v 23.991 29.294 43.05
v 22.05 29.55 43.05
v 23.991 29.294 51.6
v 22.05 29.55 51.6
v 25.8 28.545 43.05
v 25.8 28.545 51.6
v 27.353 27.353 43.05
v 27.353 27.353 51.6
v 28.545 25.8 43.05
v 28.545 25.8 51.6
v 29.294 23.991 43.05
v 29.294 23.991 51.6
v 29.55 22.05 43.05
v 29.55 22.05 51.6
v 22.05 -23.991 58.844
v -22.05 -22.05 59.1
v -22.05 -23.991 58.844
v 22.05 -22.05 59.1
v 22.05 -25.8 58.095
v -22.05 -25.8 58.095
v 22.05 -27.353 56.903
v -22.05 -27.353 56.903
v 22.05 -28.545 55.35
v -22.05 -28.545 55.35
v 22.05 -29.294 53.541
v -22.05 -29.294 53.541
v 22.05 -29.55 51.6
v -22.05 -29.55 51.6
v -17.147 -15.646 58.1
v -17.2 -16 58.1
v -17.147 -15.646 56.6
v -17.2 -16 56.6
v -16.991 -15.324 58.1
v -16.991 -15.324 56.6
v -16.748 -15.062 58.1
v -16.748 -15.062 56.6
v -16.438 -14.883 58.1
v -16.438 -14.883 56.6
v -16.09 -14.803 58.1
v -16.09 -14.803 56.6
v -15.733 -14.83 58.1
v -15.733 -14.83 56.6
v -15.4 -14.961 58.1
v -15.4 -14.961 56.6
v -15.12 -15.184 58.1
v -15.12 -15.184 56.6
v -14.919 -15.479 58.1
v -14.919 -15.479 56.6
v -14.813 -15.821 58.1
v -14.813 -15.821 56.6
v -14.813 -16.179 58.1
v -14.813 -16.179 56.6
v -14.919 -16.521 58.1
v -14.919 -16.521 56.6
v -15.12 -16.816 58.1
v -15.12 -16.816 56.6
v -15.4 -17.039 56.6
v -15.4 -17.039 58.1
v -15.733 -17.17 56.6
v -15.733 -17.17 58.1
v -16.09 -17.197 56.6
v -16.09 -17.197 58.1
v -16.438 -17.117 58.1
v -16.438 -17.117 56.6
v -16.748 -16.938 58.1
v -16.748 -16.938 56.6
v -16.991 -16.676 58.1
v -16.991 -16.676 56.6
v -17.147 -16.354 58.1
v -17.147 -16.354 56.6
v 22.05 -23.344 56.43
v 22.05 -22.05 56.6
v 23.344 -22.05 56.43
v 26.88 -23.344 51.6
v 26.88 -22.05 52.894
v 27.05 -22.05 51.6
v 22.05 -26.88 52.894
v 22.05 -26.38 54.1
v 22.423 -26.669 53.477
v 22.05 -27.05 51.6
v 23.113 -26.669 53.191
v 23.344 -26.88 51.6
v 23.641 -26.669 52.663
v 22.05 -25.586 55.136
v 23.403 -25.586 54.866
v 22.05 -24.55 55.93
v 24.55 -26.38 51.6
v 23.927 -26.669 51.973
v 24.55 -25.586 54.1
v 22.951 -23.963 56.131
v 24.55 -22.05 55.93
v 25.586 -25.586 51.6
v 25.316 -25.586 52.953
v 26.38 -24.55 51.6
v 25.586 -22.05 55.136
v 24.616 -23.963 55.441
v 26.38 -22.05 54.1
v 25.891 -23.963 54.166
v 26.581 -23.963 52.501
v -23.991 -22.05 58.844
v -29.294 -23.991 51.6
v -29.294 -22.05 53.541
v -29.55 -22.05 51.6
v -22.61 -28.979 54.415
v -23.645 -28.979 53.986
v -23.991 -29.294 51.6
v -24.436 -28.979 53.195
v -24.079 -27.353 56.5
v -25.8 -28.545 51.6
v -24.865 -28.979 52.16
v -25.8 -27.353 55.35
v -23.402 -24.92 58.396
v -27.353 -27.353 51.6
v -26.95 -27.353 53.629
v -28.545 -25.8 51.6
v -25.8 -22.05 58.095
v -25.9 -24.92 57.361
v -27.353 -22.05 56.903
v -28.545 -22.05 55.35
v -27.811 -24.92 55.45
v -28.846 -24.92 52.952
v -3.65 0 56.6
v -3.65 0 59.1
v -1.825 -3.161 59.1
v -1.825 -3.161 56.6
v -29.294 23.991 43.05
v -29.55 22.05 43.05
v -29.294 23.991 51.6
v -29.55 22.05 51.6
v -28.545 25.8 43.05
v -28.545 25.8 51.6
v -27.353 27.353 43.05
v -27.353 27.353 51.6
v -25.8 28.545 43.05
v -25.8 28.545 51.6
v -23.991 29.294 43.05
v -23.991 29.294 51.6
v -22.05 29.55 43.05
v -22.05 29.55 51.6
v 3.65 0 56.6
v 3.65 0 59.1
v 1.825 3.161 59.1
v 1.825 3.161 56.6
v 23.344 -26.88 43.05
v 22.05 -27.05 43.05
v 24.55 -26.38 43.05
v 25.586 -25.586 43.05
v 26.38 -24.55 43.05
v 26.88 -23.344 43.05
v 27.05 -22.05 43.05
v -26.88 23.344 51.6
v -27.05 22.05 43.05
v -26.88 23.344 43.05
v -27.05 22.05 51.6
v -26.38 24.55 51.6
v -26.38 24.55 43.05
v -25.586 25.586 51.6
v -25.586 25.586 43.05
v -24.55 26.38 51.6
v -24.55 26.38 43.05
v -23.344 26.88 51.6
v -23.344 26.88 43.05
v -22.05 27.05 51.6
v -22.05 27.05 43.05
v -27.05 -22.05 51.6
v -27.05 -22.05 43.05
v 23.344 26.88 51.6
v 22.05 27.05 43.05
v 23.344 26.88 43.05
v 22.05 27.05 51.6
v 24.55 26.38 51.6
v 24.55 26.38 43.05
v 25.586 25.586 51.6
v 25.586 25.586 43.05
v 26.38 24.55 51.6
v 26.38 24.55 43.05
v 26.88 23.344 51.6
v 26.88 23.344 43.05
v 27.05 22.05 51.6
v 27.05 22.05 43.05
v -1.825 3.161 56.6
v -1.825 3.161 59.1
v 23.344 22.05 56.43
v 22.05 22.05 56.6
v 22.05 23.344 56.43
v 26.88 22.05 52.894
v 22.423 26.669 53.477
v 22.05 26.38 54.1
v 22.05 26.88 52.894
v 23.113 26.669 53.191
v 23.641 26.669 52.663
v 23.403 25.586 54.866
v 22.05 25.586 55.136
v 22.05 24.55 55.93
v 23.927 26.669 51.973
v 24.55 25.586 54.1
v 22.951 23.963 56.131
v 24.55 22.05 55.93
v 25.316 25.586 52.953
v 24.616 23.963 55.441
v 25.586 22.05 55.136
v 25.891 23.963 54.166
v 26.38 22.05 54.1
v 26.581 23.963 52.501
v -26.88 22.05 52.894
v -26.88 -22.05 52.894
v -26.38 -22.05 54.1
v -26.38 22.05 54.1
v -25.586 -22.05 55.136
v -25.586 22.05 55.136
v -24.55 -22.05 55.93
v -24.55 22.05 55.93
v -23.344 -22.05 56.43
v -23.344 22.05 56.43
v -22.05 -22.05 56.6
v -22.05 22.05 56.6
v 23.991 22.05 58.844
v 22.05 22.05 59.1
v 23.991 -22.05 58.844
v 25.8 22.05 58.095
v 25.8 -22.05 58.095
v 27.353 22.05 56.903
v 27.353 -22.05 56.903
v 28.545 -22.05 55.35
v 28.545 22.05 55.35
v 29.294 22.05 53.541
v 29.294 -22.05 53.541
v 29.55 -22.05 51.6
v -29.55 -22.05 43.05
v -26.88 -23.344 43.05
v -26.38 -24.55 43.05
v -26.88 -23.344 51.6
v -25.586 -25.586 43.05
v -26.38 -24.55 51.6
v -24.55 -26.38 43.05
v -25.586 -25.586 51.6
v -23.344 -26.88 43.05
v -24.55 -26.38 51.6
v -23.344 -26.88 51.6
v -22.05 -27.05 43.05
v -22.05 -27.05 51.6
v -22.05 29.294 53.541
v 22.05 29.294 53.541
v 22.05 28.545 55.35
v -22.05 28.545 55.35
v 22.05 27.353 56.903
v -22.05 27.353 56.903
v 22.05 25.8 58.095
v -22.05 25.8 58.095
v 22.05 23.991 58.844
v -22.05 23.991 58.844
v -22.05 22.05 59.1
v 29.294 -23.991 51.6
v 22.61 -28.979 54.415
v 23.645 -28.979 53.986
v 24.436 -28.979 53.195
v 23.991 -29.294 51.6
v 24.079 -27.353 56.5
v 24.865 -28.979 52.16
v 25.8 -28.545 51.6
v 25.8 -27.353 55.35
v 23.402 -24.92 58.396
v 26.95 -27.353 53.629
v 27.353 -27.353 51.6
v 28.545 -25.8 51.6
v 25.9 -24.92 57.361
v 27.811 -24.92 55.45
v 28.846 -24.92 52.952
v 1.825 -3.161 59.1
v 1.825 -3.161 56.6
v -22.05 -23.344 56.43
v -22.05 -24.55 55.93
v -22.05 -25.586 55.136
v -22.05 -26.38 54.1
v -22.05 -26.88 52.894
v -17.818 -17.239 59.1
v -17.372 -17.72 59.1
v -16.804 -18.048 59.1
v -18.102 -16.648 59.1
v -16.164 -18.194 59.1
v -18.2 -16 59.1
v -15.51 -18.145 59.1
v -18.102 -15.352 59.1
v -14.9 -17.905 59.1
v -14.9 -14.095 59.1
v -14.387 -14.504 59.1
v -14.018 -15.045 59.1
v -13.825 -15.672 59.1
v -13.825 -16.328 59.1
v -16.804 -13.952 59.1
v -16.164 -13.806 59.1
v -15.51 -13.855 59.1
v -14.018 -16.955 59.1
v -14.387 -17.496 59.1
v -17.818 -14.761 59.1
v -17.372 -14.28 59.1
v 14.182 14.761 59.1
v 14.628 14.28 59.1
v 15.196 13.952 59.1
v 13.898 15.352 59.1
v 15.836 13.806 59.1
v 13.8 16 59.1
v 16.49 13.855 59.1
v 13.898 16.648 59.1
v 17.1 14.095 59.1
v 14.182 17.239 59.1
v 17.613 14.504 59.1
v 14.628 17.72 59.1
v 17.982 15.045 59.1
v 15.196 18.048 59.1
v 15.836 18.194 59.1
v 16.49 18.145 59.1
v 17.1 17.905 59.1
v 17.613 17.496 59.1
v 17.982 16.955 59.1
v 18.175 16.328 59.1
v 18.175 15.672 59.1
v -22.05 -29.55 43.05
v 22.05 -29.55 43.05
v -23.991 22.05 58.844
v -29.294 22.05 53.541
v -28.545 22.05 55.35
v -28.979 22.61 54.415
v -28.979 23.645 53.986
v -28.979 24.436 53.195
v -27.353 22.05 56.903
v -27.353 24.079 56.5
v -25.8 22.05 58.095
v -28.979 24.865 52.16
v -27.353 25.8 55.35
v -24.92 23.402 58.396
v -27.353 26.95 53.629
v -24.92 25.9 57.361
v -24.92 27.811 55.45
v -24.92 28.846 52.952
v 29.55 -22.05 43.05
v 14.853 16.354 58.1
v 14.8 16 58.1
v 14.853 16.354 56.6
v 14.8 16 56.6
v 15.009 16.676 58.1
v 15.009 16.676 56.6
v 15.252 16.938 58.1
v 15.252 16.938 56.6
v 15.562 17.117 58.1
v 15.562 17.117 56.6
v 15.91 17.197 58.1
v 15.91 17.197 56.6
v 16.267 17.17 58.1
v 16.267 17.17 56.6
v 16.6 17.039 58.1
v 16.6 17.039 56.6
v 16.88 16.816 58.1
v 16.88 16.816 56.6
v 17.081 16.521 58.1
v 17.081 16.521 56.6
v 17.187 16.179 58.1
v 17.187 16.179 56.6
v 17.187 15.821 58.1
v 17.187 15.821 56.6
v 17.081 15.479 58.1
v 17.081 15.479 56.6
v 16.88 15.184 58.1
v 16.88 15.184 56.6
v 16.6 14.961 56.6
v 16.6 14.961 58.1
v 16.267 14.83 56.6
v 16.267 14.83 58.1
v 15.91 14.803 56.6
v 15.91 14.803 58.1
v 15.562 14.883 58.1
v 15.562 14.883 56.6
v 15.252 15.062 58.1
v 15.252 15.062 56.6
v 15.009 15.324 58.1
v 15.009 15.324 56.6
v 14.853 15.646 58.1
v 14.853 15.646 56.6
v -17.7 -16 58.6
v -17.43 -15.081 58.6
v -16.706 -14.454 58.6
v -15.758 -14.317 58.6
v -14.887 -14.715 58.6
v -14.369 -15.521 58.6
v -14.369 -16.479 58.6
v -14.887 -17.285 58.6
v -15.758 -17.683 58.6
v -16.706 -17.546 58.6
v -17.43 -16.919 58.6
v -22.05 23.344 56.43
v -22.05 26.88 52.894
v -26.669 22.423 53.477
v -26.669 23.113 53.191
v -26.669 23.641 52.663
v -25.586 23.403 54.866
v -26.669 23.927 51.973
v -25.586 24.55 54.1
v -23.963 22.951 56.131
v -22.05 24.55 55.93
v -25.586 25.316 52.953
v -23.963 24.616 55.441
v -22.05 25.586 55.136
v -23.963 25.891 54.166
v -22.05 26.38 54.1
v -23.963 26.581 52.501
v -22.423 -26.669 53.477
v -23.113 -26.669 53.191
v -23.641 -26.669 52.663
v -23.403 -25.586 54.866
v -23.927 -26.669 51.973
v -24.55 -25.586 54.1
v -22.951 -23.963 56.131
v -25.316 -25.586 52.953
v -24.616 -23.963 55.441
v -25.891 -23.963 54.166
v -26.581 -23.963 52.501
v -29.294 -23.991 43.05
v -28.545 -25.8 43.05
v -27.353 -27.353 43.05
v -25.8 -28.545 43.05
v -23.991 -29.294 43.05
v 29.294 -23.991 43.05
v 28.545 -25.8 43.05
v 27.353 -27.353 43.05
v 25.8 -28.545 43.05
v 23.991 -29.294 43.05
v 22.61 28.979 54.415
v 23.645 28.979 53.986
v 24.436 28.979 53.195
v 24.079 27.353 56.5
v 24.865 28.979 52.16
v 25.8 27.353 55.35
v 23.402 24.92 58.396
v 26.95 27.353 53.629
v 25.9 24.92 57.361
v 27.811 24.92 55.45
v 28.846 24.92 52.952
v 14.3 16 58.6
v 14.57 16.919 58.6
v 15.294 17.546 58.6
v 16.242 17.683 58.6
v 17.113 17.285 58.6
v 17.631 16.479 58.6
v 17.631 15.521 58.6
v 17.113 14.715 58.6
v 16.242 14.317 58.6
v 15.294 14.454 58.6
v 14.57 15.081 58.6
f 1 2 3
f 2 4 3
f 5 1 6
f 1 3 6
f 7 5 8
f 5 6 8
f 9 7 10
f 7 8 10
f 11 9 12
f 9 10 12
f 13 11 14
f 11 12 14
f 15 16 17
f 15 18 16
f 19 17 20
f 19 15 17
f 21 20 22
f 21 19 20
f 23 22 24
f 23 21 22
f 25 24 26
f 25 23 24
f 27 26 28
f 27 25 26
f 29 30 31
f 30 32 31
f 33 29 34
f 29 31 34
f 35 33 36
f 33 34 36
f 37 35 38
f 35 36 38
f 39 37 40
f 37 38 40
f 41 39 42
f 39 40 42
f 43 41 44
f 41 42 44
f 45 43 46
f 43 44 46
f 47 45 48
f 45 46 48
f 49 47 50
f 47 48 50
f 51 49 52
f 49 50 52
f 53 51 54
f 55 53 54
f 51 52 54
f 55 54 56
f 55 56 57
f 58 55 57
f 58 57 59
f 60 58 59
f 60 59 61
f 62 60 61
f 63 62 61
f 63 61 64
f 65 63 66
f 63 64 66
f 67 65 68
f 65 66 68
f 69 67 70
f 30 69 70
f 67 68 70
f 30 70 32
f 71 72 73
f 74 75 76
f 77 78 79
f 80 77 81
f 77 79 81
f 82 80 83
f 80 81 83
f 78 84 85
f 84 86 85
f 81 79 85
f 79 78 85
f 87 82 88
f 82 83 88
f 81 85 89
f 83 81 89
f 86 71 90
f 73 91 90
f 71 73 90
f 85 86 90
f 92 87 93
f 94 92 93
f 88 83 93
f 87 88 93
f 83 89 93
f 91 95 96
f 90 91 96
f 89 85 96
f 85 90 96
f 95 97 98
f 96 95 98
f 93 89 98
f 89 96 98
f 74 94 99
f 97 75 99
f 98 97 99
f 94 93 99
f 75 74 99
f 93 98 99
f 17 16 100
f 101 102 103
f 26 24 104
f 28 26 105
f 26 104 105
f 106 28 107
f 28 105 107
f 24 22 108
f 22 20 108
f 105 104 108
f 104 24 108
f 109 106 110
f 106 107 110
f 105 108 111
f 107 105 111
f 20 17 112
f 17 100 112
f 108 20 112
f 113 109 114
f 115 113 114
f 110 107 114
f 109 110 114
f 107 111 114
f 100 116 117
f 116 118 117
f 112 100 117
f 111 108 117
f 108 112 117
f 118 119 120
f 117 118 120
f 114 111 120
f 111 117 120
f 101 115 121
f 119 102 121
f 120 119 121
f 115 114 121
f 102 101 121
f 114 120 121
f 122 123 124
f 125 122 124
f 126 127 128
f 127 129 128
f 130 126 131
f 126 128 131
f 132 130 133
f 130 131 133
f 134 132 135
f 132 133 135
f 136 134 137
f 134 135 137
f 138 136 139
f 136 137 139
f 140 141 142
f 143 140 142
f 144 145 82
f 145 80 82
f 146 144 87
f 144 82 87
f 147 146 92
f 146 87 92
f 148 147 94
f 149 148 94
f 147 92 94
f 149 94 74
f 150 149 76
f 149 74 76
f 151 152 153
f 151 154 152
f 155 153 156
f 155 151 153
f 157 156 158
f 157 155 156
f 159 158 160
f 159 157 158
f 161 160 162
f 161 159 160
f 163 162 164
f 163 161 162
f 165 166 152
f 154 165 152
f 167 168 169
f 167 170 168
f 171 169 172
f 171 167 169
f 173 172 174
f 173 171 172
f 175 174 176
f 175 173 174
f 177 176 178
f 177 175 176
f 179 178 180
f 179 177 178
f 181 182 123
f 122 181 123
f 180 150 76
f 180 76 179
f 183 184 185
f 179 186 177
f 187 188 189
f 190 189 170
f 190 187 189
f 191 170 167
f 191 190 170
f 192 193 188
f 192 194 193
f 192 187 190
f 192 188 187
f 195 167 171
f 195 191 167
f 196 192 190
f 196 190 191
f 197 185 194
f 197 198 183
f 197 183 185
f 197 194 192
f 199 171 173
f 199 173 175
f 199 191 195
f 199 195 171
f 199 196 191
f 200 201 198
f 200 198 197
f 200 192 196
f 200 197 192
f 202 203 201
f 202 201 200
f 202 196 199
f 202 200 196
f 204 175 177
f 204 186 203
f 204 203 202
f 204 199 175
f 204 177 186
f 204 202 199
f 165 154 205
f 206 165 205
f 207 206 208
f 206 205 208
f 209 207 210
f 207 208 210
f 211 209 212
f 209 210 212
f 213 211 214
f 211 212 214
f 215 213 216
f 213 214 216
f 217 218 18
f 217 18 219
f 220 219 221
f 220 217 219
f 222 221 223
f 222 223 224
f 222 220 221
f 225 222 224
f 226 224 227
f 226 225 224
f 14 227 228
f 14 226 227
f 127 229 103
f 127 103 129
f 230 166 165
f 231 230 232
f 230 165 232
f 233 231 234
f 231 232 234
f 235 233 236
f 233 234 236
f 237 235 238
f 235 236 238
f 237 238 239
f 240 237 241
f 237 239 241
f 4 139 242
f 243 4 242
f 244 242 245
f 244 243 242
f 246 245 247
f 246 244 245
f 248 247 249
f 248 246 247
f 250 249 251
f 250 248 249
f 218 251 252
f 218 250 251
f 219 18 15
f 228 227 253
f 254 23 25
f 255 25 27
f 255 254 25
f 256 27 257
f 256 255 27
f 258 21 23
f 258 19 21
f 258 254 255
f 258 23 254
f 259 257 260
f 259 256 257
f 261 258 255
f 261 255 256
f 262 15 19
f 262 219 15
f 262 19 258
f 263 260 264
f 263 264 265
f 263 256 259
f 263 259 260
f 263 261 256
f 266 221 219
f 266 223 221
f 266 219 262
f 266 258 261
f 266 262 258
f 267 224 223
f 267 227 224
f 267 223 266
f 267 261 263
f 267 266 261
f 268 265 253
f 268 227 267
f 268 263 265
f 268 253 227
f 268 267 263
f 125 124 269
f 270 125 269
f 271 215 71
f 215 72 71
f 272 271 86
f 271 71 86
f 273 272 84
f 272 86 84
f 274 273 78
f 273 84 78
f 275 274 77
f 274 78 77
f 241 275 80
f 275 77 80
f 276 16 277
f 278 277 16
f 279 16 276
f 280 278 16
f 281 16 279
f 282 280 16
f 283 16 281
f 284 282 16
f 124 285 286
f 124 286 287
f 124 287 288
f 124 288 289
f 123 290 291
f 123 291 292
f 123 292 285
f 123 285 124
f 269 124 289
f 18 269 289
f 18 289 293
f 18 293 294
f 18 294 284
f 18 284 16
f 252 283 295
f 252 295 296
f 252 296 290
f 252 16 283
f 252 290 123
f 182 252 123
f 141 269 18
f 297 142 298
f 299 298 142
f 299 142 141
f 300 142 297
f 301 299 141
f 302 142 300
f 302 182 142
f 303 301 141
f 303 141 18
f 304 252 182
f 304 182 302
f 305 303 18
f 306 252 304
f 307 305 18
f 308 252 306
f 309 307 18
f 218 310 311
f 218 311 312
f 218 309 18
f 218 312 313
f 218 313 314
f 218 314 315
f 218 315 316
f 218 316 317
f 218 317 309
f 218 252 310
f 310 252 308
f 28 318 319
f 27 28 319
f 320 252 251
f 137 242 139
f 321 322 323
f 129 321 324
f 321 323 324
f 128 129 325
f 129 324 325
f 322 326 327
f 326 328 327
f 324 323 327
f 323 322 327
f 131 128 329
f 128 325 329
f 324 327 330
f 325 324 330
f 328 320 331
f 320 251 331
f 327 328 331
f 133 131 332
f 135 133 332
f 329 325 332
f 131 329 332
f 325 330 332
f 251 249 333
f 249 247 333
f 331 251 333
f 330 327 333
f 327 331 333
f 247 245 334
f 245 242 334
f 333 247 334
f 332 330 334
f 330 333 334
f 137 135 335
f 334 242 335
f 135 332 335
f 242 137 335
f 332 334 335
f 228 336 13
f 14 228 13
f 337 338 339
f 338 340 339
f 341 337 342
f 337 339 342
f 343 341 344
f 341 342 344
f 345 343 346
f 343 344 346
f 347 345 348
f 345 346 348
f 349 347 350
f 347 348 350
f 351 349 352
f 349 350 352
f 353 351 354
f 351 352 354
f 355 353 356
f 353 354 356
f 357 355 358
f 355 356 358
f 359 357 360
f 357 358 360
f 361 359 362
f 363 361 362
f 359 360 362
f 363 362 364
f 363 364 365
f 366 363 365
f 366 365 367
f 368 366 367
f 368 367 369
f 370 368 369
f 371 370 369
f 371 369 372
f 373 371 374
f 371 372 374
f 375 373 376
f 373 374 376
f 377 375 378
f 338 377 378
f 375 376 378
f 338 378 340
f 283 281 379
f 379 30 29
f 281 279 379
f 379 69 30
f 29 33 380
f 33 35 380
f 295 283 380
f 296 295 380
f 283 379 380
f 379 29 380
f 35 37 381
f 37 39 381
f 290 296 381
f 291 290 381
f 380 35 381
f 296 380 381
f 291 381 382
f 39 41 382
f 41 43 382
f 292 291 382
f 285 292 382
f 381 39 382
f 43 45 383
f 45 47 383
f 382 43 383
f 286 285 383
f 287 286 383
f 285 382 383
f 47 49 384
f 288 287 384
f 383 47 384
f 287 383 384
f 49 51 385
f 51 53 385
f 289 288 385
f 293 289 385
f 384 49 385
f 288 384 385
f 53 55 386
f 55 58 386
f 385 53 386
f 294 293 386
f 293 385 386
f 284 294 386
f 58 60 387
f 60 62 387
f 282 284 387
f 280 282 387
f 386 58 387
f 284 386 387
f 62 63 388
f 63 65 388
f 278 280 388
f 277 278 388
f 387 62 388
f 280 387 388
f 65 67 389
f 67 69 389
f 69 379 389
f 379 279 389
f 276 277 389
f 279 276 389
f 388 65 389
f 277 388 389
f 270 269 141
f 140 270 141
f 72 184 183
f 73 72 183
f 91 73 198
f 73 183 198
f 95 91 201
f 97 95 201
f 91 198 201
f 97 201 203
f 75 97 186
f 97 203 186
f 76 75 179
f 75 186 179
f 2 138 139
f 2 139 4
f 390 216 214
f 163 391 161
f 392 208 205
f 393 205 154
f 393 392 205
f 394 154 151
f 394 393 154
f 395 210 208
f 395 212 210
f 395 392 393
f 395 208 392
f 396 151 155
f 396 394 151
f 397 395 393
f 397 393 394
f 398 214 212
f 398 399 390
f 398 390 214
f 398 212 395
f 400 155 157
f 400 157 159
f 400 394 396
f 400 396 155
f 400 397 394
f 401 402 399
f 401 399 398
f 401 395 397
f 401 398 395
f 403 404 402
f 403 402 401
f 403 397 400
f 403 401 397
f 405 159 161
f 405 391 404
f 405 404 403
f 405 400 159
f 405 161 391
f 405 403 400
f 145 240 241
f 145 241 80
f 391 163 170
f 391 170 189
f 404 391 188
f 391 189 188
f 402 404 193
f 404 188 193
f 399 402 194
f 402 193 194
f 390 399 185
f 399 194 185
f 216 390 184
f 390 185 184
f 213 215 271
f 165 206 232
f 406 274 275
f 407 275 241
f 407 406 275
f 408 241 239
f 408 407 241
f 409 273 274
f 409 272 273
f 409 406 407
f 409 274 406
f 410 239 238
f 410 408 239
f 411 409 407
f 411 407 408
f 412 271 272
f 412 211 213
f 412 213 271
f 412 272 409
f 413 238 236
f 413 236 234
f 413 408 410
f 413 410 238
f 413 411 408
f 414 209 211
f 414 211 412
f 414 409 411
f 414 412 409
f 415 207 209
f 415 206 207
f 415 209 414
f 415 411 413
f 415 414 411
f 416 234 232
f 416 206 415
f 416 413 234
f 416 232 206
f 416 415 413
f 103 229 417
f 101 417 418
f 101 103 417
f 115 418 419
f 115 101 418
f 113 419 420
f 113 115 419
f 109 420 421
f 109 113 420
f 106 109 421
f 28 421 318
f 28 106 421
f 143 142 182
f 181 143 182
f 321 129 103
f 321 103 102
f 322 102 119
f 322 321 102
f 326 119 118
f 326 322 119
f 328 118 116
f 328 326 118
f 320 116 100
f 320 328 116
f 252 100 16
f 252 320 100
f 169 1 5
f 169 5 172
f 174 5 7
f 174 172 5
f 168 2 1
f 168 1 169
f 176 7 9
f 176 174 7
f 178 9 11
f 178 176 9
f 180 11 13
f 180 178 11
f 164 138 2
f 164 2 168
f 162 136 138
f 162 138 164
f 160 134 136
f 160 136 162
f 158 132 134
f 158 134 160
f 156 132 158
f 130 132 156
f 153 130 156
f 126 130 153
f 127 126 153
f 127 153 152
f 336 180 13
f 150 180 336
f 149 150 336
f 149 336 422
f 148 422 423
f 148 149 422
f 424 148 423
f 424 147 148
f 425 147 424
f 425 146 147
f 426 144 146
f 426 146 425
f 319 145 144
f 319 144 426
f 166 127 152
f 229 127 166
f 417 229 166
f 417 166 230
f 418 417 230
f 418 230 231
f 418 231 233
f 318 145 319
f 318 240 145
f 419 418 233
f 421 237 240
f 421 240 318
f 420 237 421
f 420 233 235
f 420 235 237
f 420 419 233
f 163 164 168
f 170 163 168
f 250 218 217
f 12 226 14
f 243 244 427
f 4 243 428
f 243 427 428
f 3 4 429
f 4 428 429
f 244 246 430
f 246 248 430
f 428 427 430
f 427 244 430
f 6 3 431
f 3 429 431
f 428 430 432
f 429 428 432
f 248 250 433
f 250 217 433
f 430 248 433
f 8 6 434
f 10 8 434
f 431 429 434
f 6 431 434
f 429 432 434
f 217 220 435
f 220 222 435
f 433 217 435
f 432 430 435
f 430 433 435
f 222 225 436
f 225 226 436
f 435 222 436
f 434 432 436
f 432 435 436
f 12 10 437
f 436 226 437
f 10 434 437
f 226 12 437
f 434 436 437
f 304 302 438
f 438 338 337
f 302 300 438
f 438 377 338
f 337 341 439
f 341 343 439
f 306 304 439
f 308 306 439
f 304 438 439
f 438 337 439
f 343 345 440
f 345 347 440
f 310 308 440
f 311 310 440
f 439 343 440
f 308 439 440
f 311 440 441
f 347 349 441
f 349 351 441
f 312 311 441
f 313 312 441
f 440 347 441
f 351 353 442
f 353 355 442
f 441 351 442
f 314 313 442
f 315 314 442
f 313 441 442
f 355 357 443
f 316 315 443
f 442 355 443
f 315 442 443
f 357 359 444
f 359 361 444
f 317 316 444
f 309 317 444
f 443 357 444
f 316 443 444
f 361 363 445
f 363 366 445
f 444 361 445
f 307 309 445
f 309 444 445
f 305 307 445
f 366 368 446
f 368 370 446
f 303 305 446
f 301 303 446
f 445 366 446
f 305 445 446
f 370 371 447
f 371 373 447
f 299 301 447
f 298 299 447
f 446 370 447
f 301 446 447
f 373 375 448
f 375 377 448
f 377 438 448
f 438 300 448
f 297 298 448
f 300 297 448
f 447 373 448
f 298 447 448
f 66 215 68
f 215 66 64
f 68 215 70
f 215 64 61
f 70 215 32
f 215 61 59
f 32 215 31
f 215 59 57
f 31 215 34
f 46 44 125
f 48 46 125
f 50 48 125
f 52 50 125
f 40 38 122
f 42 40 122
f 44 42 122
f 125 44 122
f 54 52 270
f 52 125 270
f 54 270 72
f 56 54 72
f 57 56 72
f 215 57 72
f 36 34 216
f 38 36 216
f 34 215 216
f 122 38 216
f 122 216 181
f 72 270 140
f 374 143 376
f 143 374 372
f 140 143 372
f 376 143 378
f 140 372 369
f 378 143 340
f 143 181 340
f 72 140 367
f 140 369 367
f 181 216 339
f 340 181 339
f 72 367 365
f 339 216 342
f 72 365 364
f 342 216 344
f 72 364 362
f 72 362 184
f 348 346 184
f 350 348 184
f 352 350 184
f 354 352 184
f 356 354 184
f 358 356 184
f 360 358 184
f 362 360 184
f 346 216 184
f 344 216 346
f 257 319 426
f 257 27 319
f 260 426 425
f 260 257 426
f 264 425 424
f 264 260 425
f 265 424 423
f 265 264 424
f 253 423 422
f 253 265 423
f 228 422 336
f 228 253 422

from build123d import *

# Parameters (mm, degrees)
SKETCH1_W                                            = 59.1
SKETCH1_H                                            = 59.1
BOSS_EXTRUDE1_DEPTH                                  = 59.1
CUT_EXTRUDE1_DEPTH                                   = 94.96477218
CUT_EXTRUDE1_DEPTH_BACK                              = 3.5
SKETCH2_W                                            = 96.91536242
SKETCH2_H                                            = 99.114771323
FILLET1_R                                            = 7.5
SHELL1_T                                             = -2.5
CSK_SLOT_FOR_M2_COUNTERSUNK_FLAT_HEAD_SC_D           = 2.4
CSK_SLOT_FOR_M2_COUNTERSUNK_FLAT_HEAD_SC_CSINK_D     = 4.4
CSK_SLOT_FOR_M2_COUNTERSUNK_FLAT_HEAD_SC_CSINK_ANGLE = 90
CUT_EXTRUDE2_DEPTH                                   = 45.76614234


with BuildPart() as part:
    # Sketch1 → Boss-Extrude1 (new body)
    with BuildSketch(Plane.XY):
        Rectangle(SKETCH1_W, SKETCH1_H)
    extrude(amount=BOSS_EXTRUDE1_DEPTH)

    # Sketch2 → Cut-Extrude1 (cut, two sides: drawn at the far end of the back side and taken through both)
    with BuildSketch(Plane(origin=(30.720954492, 30.720954492, 39.55), x_dir=(0.2588190451025209, -0.9659258262890682, 0), z_dir=(0, 0, -1)).offset(-CUT_EXTRUDE1_DEPTH_BACK)):
        with Locations((21.755390695, 38.565126259)):
            Rectangle(SKETCH2_W, SKETCH2_H)
    extrude(amount=CUT_EXTRUDE1_DEPTH + CUT_EXTRUDE1_DEPTH_BACK, mode=Mode.SUBTRACT)

    # Fillet1
    fillet1_edges = [part.edges().sort_by_distance(p)[0] for p in [
        (29.55, 0, 59.1),
        (0, 29.55, 59.1),
        (-29.55, 0, 59.1),
        (0, -29.55, 59.1),
        (-29.55, 29.55, 51.075),
        (29.55, 29.55, 51.075),
        (29.55, -29.55, 51.075),
        (-29.55, -29.55, 51.075),
    ]]
    fillet(fillet1_edges, radius=FILLET1_R)

    # Shell1
    shell1_openings = [part.faces().sort_by_distance(p)[0] for p in [
        (0, 0, 43.05),
    ]]
    offset(amount=SHELL1_T, openings=shell1_openings, kind=Kind.INTERSECTION)

    # CSK SLOT for M2 Countersunk Flat Head Screw1 (through all)
    with Locations(Plane.XY.offset(59.1)):
        with Locations((16, 16), (19.892963711, -96.835353), (-16, -16)):
            CounterSinkHole(CSK_SLOT_FOR_M2_COUNTERSUNK_FLAT_HEAD_SC_D / 2, CSK_SLOT_FOR_M2_COUNTERSUNK_FLAT_HEAD_SC_CSINK_D / 2, counter_sink_angle=CSK_SLOT_FOR_M2_COUNTERSUNK_FLAT_HEAD_SC_CSINK_ANGLE)

    # Sketch20 → Cut-Extrude2 (cut, through all)
    with BuildSketch(Plane.XY.offset(59.1)):
        Polygon((-1.825, -3.160992724), (1.825, -3.160992724), (3.65, 0), (1.825, 3.160992724), (-1.825, 3.160992724), (-3.65, 0), align=None)
    extrude(amount=-CUT_EXTRUDE2_DEPTH, mode=Mode.SUBTRACT)


solid = part.part
